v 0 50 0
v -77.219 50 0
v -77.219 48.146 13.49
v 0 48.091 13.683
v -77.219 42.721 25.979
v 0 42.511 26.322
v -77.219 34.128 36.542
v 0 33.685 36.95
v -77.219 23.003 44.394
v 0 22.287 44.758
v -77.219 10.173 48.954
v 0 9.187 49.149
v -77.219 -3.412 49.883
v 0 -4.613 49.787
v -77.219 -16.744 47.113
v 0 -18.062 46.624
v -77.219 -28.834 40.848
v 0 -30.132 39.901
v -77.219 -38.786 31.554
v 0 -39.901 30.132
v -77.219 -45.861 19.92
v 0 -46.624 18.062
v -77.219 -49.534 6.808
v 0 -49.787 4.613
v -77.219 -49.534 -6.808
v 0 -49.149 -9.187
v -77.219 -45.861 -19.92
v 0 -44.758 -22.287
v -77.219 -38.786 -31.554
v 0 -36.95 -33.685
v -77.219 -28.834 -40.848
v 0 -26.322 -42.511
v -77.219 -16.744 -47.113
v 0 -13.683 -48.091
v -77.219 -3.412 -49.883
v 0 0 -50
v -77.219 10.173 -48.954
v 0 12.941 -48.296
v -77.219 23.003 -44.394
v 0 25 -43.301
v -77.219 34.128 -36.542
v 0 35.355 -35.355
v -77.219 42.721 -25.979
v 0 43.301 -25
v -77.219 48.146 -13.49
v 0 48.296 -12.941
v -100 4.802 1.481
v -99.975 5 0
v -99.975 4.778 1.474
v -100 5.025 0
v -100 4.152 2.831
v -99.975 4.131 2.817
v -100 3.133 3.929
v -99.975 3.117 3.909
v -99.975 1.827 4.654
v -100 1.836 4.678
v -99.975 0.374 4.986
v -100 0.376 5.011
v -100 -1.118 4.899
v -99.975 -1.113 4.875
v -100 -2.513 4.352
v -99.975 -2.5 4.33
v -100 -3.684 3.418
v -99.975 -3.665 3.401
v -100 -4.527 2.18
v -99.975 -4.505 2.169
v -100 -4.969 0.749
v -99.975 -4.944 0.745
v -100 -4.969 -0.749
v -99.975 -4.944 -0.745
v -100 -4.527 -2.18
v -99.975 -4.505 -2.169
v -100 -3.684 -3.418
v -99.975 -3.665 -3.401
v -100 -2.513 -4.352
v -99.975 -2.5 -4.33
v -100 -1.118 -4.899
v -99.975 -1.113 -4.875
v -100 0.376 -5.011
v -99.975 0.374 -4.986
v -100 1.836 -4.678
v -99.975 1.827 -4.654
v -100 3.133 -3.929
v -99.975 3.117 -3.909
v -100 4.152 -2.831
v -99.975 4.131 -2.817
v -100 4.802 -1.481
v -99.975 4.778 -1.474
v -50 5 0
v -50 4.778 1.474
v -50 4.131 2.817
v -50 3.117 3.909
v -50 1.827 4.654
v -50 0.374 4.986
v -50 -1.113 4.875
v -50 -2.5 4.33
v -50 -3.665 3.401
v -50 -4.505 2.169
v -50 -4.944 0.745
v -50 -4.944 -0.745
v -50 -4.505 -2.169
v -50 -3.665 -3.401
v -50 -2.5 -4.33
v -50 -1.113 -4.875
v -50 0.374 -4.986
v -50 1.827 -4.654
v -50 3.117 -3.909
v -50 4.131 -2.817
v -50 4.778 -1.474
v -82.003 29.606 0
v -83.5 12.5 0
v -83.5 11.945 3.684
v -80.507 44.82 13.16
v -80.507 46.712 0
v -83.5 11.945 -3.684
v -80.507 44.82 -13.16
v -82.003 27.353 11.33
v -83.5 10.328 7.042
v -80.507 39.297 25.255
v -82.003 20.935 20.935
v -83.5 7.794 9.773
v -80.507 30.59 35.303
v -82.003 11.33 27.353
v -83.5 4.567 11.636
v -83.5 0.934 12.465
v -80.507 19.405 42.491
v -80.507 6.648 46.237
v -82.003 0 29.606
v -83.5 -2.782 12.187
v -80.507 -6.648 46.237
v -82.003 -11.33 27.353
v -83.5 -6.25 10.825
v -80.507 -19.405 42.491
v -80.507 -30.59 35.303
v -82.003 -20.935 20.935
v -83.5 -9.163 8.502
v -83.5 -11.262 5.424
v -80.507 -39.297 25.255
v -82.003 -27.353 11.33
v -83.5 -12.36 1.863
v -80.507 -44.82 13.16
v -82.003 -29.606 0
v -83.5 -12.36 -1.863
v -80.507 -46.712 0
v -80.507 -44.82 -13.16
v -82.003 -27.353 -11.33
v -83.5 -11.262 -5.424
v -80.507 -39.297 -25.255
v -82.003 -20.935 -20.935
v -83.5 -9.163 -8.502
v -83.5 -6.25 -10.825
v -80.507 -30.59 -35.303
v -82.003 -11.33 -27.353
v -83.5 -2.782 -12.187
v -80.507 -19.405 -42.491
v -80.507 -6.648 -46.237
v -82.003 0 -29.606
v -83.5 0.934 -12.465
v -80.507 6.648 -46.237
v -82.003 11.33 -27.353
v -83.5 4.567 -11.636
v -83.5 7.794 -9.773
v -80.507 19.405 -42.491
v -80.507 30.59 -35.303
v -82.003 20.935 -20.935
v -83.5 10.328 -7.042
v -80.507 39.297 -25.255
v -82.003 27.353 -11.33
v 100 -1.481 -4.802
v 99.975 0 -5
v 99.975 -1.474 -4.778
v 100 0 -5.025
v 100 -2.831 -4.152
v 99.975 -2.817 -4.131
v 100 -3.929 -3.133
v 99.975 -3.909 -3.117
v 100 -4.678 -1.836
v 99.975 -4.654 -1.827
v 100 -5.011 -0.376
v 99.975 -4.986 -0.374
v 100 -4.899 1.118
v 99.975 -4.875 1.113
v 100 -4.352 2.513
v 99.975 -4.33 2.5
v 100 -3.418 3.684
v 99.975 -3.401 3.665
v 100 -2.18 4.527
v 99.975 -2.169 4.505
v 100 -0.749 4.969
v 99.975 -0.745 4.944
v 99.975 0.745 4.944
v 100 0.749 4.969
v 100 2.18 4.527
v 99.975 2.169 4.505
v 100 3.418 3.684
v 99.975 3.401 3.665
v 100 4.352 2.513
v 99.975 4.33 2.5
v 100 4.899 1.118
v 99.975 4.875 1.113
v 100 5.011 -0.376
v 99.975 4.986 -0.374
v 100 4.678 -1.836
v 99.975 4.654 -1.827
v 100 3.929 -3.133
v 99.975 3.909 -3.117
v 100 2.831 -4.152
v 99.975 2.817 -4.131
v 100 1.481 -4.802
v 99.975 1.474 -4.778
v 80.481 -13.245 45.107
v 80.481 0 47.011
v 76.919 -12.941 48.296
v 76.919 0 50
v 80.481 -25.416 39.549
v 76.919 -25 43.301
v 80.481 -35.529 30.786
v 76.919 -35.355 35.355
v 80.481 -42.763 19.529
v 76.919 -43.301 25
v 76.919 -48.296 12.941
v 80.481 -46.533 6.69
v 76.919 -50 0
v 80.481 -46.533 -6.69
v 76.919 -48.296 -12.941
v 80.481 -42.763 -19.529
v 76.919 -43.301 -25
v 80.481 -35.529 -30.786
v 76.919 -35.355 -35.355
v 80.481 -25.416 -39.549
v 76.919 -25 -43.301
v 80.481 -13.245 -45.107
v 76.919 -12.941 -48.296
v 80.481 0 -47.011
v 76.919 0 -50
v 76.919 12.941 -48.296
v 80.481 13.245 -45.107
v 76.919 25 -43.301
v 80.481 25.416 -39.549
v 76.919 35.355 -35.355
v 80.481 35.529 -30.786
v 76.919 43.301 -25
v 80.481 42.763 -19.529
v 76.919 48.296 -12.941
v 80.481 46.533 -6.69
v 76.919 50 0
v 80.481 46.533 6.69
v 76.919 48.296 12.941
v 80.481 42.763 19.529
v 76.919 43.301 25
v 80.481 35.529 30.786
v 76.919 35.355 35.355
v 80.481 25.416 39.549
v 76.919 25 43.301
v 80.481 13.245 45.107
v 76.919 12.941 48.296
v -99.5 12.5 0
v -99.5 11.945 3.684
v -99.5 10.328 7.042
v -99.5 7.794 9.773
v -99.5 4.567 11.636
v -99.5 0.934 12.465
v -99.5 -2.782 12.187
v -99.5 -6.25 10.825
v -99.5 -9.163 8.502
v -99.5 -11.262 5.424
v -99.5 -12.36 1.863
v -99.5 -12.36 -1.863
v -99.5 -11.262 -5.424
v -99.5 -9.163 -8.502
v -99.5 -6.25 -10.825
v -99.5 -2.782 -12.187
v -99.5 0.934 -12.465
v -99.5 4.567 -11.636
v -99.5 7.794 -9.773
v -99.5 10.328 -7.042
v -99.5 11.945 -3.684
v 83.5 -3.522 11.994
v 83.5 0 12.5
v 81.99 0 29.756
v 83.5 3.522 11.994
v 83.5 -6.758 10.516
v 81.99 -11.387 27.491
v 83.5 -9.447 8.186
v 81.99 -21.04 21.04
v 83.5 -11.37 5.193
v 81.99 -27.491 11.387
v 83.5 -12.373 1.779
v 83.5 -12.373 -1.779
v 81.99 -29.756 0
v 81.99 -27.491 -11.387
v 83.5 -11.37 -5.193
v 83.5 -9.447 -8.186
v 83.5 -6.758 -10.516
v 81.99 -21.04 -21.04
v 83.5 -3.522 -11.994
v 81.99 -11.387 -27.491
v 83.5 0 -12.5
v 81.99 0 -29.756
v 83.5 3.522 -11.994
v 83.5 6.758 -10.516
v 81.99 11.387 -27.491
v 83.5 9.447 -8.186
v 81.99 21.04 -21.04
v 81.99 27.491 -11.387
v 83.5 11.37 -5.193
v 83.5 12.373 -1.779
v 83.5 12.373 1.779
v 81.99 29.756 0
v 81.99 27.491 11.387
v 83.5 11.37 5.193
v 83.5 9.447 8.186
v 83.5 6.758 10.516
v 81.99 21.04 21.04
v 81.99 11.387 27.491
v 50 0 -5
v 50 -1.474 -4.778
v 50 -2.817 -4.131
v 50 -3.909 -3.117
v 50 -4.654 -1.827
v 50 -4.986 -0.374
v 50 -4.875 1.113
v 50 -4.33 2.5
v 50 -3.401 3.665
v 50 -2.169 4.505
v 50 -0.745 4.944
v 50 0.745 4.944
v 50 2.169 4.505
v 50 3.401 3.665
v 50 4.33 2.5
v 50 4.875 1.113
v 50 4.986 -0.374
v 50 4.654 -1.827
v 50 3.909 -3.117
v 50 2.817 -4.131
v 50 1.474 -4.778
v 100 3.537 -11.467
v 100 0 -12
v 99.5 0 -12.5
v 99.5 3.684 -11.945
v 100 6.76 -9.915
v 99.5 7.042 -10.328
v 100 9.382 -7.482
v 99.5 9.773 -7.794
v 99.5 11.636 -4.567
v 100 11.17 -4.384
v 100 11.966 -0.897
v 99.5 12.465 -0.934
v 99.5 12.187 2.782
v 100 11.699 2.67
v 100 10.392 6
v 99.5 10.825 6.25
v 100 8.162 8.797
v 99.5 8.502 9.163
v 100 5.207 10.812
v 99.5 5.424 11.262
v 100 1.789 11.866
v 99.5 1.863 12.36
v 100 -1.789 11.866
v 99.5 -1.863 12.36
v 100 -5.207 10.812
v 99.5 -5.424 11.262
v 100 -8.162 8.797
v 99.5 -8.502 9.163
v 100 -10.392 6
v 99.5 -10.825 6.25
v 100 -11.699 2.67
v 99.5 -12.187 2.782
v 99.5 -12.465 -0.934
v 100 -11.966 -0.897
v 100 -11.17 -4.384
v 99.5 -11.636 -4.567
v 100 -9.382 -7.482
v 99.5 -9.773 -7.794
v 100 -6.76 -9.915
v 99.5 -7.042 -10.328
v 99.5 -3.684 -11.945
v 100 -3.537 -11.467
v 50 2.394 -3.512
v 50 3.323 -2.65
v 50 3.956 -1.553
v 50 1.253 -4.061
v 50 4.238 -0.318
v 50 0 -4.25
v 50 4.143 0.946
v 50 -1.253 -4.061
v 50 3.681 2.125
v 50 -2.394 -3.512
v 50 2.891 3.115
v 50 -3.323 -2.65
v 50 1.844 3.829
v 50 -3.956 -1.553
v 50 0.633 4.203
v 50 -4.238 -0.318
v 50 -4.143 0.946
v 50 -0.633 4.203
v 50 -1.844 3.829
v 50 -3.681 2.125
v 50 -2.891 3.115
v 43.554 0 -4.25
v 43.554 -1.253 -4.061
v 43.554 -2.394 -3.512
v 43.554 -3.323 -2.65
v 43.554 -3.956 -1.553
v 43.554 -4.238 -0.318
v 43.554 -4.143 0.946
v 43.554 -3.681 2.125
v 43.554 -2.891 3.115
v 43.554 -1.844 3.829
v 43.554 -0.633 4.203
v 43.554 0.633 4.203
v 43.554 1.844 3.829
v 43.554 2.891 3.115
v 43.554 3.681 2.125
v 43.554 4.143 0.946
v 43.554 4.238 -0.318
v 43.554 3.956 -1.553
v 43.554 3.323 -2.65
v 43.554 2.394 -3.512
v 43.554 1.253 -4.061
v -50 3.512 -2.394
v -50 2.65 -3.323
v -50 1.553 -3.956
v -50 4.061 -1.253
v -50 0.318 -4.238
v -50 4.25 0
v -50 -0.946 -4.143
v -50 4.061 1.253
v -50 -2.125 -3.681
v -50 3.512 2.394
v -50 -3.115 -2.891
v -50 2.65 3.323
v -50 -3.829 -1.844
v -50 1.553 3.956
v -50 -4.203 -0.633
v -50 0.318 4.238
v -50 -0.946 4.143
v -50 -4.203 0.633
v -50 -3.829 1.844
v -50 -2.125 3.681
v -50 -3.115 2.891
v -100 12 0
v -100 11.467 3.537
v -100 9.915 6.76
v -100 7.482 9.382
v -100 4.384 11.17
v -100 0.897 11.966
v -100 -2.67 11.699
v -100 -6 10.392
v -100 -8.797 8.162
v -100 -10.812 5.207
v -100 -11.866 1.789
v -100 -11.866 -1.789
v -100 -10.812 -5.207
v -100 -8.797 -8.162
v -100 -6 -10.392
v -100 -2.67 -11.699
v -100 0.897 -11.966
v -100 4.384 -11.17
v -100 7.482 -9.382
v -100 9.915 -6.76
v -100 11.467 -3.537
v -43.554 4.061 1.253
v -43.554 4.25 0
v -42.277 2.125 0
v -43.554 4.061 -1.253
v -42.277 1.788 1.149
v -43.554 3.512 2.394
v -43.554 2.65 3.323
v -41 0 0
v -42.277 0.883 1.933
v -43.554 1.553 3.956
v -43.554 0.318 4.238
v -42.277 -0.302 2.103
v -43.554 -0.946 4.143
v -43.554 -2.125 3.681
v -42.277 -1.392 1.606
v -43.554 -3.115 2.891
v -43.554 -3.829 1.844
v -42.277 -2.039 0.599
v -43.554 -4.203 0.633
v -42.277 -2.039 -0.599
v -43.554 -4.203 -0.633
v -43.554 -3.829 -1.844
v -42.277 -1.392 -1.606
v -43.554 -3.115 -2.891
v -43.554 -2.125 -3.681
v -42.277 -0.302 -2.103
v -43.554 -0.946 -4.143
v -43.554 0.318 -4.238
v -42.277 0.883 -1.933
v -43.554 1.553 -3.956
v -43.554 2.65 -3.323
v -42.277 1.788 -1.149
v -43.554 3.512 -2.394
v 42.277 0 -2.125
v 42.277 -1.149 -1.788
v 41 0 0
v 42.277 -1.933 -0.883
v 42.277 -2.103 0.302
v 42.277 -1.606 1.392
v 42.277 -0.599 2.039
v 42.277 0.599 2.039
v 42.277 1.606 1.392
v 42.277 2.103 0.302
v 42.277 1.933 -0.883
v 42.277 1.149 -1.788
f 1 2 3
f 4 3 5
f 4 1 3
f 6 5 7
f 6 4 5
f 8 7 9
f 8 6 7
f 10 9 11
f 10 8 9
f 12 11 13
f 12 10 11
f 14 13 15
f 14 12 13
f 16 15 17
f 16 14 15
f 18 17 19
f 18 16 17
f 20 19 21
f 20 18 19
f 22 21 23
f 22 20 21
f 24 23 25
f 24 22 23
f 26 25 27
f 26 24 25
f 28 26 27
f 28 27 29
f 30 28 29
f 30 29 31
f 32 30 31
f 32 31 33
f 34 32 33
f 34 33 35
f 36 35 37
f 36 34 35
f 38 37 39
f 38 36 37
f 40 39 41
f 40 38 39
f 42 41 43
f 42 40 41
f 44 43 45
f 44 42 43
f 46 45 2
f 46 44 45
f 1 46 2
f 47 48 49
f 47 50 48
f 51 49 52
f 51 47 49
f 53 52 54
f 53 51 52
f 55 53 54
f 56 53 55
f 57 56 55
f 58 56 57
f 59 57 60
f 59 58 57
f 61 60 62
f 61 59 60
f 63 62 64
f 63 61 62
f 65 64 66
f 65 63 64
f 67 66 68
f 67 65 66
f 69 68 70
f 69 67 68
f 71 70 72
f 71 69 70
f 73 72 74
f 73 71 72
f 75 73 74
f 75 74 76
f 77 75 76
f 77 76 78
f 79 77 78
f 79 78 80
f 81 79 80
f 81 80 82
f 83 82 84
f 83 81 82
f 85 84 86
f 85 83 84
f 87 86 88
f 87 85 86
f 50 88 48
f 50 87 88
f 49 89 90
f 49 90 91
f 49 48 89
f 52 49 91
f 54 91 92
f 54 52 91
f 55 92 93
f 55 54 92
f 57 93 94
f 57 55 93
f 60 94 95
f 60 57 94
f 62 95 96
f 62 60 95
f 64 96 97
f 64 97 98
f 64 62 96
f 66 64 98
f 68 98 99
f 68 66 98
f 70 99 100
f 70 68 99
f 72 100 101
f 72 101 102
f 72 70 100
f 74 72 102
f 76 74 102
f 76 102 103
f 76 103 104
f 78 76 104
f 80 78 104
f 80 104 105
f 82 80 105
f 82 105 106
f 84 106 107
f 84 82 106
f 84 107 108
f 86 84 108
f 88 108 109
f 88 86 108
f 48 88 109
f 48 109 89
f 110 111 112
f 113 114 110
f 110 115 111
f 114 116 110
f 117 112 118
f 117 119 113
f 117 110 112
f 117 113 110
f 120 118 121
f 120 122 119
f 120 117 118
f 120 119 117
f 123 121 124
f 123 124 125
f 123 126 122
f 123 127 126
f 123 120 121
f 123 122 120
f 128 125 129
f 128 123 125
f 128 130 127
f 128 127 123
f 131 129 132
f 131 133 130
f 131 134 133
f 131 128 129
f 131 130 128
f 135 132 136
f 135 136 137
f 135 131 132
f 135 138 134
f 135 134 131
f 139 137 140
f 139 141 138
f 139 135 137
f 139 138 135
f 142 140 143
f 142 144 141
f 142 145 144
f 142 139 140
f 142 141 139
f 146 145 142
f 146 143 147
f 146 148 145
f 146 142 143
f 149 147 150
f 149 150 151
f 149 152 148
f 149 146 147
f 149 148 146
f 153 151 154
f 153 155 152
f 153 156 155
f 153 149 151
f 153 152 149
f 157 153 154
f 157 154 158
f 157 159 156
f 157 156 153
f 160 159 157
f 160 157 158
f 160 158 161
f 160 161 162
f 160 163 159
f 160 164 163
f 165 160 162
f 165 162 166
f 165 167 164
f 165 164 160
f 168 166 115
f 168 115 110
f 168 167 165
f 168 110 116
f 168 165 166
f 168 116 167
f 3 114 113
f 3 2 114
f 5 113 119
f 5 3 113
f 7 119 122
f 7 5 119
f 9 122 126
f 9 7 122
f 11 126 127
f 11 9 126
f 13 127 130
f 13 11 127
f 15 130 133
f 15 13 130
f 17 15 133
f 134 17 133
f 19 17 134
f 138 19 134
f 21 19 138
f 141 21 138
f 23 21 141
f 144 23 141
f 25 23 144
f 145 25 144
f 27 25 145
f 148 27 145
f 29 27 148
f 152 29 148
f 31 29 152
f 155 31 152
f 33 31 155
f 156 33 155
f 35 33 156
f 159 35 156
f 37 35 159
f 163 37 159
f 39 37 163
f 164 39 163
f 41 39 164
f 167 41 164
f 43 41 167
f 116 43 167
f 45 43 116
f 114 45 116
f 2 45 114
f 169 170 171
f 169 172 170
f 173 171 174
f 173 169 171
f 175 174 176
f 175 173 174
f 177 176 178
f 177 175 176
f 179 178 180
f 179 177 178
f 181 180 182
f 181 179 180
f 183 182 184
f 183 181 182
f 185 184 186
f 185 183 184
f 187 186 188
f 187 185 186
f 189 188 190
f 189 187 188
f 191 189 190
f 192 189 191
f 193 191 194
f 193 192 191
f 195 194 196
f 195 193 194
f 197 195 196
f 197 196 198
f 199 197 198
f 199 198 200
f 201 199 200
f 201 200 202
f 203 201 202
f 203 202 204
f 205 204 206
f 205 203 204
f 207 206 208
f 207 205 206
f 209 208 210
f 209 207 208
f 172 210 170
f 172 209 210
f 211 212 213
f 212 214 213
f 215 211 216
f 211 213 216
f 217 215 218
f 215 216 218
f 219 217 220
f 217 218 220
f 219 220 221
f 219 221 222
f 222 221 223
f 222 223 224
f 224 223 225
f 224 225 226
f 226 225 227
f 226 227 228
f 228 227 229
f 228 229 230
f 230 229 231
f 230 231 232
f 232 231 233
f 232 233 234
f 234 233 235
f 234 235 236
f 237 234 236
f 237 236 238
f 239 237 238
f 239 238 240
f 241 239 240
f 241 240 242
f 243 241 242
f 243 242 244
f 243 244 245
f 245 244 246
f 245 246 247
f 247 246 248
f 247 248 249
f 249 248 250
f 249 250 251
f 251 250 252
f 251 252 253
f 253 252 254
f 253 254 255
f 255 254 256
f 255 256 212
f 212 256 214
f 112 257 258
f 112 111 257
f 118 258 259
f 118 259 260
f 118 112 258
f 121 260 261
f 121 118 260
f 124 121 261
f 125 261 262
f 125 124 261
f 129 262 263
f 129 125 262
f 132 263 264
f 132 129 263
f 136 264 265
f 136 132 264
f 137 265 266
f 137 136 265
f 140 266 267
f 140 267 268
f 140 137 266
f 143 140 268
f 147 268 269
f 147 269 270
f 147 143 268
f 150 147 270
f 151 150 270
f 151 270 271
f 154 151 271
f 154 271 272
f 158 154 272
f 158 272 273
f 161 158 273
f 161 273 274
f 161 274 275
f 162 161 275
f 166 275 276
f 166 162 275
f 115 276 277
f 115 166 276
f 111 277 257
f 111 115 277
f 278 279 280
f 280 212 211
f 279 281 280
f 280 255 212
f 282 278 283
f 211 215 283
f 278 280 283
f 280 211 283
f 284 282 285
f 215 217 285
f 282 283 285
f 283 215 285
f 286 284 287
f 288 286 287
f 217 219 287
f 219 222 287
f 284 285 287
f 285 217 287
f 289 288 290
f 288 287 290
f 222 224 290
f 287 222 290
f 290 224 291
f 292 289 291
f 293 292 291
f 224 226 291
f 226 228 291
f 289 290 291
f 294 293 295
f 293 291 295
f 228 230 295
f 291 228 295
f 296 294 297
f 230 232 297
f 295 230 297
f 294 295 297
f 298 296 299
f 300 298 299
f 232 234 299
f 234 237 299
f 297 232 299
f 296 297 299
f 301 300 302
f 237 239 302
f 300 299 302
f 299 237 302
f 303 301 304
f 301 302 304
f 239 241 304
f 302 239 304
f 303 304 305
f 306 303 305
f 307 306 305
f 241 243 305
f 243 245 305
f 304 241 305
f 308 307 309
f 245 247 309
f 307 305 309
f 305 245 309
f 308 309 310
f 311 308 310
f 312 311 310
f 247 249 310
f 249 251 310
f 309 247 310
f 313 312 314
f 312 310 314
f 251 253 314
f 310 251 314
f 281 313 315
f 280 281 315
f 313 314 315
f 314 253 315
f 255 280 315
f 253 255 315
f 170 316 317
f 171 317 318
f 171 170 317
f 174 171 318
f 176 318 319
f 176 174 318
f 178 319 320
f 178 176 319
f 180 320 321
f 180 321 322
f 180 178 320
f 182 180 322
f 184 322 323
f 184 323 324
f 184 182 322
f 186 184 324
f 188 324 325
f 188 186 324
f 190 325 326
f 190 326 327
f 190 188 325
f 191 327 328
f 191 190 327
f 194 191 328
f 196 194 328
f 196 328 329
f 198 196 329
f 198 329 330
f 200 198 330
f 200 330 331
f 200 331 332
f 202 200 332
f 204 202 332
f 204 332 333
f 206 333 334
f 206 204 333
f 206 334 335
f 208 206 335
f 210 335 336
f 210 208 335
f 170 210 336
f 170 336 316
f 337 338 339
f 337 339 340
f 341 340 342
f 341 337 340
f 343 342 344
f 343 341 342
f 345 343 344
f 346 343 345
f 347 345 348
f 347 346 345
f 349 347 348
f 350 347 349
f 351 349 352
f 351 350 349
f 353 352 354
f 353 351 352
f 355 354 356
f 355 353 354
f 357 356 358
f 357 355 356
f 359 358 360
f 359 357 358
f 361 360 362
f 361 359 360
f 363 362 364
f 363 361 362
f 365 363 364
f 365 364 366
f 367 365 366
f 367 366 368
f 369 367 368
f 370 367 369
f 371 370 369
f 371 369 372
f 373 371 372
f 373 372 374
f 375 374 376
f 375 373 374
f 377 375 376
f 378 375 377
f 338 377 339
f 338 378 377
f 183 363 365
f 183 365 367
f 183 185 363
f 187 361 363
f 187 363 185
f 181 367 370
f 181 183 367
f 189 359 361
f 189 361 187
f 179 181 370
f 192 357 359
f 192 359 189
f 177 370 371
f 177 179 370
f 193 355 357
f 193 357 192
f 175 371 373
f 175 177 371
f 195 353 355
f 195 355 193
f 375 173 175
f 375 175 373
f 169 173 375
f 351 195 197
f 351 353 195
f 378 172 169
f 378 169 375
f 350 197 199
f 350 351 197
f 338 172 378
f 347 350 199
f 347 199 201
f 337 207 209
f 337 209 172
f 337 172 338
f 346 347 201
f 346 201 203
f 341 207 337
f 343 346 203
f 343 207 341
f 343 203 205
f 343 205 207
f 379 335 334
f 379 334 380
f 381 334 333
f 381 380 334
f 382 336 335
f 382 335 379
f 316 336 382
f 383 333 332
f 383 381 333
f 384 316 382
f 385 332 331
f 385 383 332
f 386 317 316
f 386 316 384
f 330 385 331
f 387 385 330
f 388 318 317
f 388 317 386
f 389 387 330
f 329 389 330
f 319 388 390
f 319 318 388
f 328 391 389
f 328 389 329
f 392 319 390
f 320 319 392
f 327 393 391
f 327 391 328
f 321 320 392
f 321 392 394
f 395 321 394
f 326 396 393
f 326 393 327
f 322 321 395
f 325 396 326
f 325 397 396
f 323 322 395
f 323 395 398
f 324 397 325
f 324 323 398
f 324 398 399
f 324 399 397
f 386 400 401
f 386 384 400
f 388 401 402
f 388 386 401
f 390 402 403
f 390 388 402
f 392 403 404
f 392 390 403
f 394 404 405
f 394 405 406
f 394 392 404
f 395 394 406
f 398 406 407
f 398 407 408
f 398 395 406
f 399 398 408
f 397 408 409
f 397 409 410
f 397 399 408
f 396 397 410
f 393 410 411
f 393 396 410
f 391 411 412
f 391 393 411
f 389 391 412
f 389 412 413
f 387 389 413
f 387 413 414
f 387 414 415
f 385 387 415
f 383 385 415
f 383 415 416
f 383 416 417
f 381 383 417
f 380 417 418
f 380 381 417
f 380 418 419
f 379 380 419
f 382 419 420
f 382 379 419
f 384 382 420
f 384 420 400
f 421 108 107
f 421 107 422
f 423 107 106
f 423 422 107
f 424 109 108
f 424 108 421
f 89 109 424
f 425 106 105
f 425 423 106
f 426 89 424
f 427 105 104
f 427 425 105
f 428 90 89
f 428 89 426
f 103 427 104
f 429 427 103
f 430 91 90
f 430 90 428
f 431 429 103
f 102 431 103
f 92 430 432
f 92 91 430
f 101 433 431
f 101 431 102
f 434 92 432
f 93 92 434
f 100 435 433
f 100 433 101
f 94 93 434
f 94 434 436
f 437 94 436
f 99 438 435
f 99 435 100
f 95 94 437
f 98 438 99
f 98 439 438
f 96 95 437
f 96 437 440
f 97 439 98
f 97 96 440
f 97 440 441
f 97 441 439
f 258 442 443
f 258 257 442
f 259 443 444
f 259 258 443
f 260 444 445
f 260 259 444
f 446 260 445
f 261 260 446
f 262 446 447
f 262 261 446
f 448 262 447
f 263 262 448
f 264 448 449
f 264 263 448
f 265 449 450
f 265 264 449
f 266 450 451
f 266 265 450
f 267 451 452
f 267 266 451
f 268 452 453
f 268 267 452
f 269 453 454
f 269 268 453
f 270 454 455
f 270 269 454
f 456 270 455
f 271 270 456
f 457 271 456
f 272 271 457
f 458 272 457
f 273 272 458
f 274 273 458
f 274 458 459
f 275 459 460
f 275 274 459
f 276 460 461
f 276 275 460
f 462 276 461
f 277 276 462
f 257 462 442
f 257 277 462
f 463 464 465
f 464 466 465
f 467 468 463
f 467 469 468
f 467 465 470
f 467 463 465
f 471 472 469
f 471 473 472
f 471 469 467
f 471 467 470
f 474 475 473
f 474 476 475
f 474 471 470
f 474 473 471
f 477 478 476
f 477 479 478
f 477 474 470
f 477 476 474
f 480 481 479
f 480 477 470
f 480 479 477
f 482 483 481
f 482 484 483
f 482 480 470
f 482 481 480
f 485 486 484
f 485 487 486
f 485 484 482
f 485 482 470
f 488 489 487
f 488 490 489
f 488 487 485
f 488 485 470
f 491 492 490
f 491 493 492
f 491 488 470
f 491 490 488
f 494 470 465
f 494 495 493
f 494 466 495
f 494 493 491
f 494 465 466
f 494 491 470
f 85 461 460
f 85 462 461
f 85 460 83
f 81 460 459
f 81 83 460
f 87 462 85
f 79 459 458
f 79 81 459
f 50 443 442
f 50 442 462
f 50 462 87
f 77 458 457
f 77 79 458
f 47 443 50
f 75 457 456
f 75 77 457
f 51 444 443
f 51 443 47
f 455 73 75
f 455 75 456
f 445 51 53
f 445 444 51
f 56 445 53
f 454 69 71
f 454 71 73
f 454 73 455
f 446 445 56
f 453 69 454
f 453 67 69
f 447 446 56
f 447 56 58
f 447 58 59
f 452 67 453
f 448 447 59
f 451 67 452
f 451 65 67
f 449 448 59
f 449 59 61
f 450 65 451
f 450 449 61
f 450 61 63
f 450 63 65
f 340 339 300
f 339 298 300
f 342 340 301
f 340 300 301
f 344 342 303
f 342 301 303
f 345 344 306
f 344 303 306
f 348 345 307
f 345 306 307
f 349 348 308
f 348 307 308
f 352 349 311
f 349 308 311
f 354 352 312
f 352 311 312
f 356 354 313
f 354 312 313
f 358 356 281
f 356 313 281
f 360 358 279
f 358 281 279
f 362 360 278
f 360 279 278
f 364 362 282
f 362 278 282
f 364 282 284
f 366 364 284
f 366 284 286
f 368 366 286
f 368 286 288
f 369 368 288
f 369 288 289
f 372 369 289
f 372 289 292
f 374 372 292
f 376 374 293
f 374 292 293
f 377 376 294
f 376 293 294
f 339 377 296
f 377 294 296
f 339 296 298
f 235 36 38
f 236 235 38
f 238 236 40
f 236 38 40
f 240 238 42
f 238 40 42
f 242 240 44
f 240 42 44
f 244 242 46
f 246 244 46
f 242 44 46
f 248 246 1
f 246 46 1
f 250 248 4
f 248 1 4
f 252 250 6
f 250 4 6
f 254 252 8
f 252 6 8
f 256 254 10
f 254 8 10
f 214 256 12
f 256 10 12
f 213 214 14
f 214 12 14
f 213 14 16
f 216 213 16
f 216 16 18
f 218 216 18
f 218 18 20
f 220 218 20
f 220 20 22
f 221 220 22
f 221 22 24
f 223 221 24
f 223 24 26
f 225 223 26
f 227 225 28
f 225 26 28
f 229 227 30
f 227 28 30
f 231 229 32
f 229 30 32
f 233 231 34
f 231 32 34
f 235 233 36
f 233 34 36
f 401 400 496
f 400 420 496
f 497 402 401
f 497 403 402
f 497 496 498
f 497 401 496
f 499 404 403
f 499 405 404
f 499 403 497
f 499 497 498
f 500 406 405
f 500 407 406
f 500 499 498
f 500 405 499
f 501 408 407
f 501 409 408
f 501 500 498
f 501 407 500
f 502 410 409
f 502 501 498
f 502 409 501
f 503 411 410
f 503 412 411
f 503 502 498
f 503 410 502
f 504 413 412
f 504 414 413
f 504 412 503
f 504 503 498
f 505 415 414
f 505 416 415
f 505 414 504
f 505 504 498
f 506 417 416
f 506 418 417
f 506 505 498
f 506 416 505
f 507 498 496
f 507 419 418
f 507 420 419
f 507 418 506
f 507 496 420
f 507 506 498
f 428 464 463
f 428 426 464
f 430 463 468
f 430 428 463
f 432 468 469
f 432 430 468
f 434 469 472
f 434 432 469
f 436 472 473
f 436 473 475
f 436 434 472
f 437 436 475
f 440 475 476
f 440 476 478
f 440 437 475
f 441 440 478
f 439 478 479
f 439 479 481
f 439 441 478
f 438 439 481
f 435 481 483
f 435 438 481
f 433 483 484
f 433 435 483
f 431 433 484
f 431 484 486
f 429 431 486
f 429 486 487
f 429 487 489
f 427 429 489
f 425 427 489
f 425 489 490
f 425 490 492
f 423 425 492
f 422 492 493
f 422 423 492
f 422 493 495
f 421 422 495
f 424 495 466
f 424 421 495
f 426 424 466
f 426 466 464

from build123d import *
from build123d.topology import SkipClean

# Parameters (mm, degrees)
SKETCH2_R           = 50
BOSS_EXTRUDE1_DEPTH = 100
CUT_EXTRUDE1_START  = -16.5
SKETCH3_R           = 50
SKETCH3_R_2         = 12.5
CUT_EXTRUDE1_DEPTH  = 16.5
CHAMFER2_SIZE       = 0.5
CHAMFER3_SIZE       = 3
CHAMFER3_SIZE_2     = 3.300188603


# Read off the part's stored shape, not the designer's step: Mirror1
with BuildPart() as part:
    # Sketch2 → Boss-Extrude1 (new body)
    with BuildSketch(Plane.YZ):
        with Locations(Location((0, 0, 0), (0, 0, 270))):
            Circle(SKETCH2_R)
    extrude(amount=BOSS_EXTRUDE1_DEPTH)

    # Sketch3 → Cut-Extrude1 (cut)
    with BuildSketch(Plane.YZ.offset(100).offset(CUT_EXTRUDE1_START)):
        with Locations(Location((0, 0, 0), (0, 0, 270))):
            Circle(SKETCH3_R)
        with Locations(Location((0, 0, 0), (0, 0, 270))):
            Circle(SKETCH3_R_2, mode=Mode.SUBTRACT)
    extrude(amount=CUT_EXTRUDE1_DEPTH, mode=Mode.SUBTRACT)

    # Chamfer2
    chamfer2_edges = [part.edges().sort_by_distance(p)[0] for p in [
        (100, 0, 12.5),
    ]]
    chamfer(chamfer2_edges, length=CHAMFER2_SIZE)

    # Sketch4 → Cut-Revolve2 (revolve, cut)
    with BuildSketch(Plane(origin=(0, 0, 0), x_dir=(-1, 0, 0), z_dir=(0, 1, 0))):
        Polygon((-83.5, 12.5), (-80.219175118, 50), (-83.5, 50), align=None)
    revolve(axis=Axis((0, 0, 0), (1, 0, 0)), mode=Mode.SUBTRACT)

    # Chamfer3
    # the kernel refuses this chamfer: 3.300188603, 3 mm, written as the material it takes off along each edge
    with BuildSketch(Plane(origin=(80.219175118, 0, 0), x_dir=(0, 0, 1), z_dir=(0, 1, 0))) as chamfer3_piece_1:
        Polygon((50 - CHAMFER3_SIZE * 0.996194698092, CHAMFER3_SIZE * 0.0871557427477), (50, -CHAMFER3_SIZE_2), (50, 0), align=None)
    revolve(axis=Axis((80.219175118, 0, 0), (1, 0, 0)), revolution_arc=180, mode=Mode.SUBTRACT)
    with BuildSketch(Plane(origin=(80.219175118, 0, 0), x_dir=(0, 0, -1), z_dir=(0, -1, 0))) as chamfer3_piece_2:
        Polygon((50 - CHAMFER3_SIZE * 0.996194698092, CHAMFER3_SIZE * 0.0871557427477), (50, -CHAMFER3_SIZE_2), (50, 0), align=None)
    revolve(axis=Axis((80.219175118, 0, 0), (1, 0, 0)), revolution_arc=180, mode=Mode.SUBTRACT)

    # Sketch7 → M10 Tapped Hole1 (revolve, cut)
    with BuildSketch(Plane(origin=(100, 0, 0), x_dir=(0, 0, -1), z_dir=(0, 1, 0))):
        Polygon((0, 0), (0, 59), (4.25, 56.446342369), (4.25, 50), (5, 50), (5, 0.025), (5.025, 0), align=None)
    revolve(axis=Axis((106.35, 0, 0), (-1, 0, 0)), mode=Mode.SUBTRACT)

    # Mirror1 outline → Mirror1 (revolve)
    with SkipClean():  # the faces are left unmerged after this step: merging them gives an invalid solid
        with BuildSketch(Plane.YX):
            Polygon((50, 0), (0, 0), (0, -41), (4.25, -43.553657631), (4.25, -50), (5, -50), (5, -99.975), (5.025, -100), (12, -100), (12.5, -99.5), (12.5, -83.5), (46.712369611, -80.506805507), (50, -77.219175118), align=None)
        revolve(axis=Axis((0, 0, 0), (1, 0, 0)))
    add(part.part.scale(1), mode=Mode.REPLACE)  # the faces are merged on a copy


solid = part.part
